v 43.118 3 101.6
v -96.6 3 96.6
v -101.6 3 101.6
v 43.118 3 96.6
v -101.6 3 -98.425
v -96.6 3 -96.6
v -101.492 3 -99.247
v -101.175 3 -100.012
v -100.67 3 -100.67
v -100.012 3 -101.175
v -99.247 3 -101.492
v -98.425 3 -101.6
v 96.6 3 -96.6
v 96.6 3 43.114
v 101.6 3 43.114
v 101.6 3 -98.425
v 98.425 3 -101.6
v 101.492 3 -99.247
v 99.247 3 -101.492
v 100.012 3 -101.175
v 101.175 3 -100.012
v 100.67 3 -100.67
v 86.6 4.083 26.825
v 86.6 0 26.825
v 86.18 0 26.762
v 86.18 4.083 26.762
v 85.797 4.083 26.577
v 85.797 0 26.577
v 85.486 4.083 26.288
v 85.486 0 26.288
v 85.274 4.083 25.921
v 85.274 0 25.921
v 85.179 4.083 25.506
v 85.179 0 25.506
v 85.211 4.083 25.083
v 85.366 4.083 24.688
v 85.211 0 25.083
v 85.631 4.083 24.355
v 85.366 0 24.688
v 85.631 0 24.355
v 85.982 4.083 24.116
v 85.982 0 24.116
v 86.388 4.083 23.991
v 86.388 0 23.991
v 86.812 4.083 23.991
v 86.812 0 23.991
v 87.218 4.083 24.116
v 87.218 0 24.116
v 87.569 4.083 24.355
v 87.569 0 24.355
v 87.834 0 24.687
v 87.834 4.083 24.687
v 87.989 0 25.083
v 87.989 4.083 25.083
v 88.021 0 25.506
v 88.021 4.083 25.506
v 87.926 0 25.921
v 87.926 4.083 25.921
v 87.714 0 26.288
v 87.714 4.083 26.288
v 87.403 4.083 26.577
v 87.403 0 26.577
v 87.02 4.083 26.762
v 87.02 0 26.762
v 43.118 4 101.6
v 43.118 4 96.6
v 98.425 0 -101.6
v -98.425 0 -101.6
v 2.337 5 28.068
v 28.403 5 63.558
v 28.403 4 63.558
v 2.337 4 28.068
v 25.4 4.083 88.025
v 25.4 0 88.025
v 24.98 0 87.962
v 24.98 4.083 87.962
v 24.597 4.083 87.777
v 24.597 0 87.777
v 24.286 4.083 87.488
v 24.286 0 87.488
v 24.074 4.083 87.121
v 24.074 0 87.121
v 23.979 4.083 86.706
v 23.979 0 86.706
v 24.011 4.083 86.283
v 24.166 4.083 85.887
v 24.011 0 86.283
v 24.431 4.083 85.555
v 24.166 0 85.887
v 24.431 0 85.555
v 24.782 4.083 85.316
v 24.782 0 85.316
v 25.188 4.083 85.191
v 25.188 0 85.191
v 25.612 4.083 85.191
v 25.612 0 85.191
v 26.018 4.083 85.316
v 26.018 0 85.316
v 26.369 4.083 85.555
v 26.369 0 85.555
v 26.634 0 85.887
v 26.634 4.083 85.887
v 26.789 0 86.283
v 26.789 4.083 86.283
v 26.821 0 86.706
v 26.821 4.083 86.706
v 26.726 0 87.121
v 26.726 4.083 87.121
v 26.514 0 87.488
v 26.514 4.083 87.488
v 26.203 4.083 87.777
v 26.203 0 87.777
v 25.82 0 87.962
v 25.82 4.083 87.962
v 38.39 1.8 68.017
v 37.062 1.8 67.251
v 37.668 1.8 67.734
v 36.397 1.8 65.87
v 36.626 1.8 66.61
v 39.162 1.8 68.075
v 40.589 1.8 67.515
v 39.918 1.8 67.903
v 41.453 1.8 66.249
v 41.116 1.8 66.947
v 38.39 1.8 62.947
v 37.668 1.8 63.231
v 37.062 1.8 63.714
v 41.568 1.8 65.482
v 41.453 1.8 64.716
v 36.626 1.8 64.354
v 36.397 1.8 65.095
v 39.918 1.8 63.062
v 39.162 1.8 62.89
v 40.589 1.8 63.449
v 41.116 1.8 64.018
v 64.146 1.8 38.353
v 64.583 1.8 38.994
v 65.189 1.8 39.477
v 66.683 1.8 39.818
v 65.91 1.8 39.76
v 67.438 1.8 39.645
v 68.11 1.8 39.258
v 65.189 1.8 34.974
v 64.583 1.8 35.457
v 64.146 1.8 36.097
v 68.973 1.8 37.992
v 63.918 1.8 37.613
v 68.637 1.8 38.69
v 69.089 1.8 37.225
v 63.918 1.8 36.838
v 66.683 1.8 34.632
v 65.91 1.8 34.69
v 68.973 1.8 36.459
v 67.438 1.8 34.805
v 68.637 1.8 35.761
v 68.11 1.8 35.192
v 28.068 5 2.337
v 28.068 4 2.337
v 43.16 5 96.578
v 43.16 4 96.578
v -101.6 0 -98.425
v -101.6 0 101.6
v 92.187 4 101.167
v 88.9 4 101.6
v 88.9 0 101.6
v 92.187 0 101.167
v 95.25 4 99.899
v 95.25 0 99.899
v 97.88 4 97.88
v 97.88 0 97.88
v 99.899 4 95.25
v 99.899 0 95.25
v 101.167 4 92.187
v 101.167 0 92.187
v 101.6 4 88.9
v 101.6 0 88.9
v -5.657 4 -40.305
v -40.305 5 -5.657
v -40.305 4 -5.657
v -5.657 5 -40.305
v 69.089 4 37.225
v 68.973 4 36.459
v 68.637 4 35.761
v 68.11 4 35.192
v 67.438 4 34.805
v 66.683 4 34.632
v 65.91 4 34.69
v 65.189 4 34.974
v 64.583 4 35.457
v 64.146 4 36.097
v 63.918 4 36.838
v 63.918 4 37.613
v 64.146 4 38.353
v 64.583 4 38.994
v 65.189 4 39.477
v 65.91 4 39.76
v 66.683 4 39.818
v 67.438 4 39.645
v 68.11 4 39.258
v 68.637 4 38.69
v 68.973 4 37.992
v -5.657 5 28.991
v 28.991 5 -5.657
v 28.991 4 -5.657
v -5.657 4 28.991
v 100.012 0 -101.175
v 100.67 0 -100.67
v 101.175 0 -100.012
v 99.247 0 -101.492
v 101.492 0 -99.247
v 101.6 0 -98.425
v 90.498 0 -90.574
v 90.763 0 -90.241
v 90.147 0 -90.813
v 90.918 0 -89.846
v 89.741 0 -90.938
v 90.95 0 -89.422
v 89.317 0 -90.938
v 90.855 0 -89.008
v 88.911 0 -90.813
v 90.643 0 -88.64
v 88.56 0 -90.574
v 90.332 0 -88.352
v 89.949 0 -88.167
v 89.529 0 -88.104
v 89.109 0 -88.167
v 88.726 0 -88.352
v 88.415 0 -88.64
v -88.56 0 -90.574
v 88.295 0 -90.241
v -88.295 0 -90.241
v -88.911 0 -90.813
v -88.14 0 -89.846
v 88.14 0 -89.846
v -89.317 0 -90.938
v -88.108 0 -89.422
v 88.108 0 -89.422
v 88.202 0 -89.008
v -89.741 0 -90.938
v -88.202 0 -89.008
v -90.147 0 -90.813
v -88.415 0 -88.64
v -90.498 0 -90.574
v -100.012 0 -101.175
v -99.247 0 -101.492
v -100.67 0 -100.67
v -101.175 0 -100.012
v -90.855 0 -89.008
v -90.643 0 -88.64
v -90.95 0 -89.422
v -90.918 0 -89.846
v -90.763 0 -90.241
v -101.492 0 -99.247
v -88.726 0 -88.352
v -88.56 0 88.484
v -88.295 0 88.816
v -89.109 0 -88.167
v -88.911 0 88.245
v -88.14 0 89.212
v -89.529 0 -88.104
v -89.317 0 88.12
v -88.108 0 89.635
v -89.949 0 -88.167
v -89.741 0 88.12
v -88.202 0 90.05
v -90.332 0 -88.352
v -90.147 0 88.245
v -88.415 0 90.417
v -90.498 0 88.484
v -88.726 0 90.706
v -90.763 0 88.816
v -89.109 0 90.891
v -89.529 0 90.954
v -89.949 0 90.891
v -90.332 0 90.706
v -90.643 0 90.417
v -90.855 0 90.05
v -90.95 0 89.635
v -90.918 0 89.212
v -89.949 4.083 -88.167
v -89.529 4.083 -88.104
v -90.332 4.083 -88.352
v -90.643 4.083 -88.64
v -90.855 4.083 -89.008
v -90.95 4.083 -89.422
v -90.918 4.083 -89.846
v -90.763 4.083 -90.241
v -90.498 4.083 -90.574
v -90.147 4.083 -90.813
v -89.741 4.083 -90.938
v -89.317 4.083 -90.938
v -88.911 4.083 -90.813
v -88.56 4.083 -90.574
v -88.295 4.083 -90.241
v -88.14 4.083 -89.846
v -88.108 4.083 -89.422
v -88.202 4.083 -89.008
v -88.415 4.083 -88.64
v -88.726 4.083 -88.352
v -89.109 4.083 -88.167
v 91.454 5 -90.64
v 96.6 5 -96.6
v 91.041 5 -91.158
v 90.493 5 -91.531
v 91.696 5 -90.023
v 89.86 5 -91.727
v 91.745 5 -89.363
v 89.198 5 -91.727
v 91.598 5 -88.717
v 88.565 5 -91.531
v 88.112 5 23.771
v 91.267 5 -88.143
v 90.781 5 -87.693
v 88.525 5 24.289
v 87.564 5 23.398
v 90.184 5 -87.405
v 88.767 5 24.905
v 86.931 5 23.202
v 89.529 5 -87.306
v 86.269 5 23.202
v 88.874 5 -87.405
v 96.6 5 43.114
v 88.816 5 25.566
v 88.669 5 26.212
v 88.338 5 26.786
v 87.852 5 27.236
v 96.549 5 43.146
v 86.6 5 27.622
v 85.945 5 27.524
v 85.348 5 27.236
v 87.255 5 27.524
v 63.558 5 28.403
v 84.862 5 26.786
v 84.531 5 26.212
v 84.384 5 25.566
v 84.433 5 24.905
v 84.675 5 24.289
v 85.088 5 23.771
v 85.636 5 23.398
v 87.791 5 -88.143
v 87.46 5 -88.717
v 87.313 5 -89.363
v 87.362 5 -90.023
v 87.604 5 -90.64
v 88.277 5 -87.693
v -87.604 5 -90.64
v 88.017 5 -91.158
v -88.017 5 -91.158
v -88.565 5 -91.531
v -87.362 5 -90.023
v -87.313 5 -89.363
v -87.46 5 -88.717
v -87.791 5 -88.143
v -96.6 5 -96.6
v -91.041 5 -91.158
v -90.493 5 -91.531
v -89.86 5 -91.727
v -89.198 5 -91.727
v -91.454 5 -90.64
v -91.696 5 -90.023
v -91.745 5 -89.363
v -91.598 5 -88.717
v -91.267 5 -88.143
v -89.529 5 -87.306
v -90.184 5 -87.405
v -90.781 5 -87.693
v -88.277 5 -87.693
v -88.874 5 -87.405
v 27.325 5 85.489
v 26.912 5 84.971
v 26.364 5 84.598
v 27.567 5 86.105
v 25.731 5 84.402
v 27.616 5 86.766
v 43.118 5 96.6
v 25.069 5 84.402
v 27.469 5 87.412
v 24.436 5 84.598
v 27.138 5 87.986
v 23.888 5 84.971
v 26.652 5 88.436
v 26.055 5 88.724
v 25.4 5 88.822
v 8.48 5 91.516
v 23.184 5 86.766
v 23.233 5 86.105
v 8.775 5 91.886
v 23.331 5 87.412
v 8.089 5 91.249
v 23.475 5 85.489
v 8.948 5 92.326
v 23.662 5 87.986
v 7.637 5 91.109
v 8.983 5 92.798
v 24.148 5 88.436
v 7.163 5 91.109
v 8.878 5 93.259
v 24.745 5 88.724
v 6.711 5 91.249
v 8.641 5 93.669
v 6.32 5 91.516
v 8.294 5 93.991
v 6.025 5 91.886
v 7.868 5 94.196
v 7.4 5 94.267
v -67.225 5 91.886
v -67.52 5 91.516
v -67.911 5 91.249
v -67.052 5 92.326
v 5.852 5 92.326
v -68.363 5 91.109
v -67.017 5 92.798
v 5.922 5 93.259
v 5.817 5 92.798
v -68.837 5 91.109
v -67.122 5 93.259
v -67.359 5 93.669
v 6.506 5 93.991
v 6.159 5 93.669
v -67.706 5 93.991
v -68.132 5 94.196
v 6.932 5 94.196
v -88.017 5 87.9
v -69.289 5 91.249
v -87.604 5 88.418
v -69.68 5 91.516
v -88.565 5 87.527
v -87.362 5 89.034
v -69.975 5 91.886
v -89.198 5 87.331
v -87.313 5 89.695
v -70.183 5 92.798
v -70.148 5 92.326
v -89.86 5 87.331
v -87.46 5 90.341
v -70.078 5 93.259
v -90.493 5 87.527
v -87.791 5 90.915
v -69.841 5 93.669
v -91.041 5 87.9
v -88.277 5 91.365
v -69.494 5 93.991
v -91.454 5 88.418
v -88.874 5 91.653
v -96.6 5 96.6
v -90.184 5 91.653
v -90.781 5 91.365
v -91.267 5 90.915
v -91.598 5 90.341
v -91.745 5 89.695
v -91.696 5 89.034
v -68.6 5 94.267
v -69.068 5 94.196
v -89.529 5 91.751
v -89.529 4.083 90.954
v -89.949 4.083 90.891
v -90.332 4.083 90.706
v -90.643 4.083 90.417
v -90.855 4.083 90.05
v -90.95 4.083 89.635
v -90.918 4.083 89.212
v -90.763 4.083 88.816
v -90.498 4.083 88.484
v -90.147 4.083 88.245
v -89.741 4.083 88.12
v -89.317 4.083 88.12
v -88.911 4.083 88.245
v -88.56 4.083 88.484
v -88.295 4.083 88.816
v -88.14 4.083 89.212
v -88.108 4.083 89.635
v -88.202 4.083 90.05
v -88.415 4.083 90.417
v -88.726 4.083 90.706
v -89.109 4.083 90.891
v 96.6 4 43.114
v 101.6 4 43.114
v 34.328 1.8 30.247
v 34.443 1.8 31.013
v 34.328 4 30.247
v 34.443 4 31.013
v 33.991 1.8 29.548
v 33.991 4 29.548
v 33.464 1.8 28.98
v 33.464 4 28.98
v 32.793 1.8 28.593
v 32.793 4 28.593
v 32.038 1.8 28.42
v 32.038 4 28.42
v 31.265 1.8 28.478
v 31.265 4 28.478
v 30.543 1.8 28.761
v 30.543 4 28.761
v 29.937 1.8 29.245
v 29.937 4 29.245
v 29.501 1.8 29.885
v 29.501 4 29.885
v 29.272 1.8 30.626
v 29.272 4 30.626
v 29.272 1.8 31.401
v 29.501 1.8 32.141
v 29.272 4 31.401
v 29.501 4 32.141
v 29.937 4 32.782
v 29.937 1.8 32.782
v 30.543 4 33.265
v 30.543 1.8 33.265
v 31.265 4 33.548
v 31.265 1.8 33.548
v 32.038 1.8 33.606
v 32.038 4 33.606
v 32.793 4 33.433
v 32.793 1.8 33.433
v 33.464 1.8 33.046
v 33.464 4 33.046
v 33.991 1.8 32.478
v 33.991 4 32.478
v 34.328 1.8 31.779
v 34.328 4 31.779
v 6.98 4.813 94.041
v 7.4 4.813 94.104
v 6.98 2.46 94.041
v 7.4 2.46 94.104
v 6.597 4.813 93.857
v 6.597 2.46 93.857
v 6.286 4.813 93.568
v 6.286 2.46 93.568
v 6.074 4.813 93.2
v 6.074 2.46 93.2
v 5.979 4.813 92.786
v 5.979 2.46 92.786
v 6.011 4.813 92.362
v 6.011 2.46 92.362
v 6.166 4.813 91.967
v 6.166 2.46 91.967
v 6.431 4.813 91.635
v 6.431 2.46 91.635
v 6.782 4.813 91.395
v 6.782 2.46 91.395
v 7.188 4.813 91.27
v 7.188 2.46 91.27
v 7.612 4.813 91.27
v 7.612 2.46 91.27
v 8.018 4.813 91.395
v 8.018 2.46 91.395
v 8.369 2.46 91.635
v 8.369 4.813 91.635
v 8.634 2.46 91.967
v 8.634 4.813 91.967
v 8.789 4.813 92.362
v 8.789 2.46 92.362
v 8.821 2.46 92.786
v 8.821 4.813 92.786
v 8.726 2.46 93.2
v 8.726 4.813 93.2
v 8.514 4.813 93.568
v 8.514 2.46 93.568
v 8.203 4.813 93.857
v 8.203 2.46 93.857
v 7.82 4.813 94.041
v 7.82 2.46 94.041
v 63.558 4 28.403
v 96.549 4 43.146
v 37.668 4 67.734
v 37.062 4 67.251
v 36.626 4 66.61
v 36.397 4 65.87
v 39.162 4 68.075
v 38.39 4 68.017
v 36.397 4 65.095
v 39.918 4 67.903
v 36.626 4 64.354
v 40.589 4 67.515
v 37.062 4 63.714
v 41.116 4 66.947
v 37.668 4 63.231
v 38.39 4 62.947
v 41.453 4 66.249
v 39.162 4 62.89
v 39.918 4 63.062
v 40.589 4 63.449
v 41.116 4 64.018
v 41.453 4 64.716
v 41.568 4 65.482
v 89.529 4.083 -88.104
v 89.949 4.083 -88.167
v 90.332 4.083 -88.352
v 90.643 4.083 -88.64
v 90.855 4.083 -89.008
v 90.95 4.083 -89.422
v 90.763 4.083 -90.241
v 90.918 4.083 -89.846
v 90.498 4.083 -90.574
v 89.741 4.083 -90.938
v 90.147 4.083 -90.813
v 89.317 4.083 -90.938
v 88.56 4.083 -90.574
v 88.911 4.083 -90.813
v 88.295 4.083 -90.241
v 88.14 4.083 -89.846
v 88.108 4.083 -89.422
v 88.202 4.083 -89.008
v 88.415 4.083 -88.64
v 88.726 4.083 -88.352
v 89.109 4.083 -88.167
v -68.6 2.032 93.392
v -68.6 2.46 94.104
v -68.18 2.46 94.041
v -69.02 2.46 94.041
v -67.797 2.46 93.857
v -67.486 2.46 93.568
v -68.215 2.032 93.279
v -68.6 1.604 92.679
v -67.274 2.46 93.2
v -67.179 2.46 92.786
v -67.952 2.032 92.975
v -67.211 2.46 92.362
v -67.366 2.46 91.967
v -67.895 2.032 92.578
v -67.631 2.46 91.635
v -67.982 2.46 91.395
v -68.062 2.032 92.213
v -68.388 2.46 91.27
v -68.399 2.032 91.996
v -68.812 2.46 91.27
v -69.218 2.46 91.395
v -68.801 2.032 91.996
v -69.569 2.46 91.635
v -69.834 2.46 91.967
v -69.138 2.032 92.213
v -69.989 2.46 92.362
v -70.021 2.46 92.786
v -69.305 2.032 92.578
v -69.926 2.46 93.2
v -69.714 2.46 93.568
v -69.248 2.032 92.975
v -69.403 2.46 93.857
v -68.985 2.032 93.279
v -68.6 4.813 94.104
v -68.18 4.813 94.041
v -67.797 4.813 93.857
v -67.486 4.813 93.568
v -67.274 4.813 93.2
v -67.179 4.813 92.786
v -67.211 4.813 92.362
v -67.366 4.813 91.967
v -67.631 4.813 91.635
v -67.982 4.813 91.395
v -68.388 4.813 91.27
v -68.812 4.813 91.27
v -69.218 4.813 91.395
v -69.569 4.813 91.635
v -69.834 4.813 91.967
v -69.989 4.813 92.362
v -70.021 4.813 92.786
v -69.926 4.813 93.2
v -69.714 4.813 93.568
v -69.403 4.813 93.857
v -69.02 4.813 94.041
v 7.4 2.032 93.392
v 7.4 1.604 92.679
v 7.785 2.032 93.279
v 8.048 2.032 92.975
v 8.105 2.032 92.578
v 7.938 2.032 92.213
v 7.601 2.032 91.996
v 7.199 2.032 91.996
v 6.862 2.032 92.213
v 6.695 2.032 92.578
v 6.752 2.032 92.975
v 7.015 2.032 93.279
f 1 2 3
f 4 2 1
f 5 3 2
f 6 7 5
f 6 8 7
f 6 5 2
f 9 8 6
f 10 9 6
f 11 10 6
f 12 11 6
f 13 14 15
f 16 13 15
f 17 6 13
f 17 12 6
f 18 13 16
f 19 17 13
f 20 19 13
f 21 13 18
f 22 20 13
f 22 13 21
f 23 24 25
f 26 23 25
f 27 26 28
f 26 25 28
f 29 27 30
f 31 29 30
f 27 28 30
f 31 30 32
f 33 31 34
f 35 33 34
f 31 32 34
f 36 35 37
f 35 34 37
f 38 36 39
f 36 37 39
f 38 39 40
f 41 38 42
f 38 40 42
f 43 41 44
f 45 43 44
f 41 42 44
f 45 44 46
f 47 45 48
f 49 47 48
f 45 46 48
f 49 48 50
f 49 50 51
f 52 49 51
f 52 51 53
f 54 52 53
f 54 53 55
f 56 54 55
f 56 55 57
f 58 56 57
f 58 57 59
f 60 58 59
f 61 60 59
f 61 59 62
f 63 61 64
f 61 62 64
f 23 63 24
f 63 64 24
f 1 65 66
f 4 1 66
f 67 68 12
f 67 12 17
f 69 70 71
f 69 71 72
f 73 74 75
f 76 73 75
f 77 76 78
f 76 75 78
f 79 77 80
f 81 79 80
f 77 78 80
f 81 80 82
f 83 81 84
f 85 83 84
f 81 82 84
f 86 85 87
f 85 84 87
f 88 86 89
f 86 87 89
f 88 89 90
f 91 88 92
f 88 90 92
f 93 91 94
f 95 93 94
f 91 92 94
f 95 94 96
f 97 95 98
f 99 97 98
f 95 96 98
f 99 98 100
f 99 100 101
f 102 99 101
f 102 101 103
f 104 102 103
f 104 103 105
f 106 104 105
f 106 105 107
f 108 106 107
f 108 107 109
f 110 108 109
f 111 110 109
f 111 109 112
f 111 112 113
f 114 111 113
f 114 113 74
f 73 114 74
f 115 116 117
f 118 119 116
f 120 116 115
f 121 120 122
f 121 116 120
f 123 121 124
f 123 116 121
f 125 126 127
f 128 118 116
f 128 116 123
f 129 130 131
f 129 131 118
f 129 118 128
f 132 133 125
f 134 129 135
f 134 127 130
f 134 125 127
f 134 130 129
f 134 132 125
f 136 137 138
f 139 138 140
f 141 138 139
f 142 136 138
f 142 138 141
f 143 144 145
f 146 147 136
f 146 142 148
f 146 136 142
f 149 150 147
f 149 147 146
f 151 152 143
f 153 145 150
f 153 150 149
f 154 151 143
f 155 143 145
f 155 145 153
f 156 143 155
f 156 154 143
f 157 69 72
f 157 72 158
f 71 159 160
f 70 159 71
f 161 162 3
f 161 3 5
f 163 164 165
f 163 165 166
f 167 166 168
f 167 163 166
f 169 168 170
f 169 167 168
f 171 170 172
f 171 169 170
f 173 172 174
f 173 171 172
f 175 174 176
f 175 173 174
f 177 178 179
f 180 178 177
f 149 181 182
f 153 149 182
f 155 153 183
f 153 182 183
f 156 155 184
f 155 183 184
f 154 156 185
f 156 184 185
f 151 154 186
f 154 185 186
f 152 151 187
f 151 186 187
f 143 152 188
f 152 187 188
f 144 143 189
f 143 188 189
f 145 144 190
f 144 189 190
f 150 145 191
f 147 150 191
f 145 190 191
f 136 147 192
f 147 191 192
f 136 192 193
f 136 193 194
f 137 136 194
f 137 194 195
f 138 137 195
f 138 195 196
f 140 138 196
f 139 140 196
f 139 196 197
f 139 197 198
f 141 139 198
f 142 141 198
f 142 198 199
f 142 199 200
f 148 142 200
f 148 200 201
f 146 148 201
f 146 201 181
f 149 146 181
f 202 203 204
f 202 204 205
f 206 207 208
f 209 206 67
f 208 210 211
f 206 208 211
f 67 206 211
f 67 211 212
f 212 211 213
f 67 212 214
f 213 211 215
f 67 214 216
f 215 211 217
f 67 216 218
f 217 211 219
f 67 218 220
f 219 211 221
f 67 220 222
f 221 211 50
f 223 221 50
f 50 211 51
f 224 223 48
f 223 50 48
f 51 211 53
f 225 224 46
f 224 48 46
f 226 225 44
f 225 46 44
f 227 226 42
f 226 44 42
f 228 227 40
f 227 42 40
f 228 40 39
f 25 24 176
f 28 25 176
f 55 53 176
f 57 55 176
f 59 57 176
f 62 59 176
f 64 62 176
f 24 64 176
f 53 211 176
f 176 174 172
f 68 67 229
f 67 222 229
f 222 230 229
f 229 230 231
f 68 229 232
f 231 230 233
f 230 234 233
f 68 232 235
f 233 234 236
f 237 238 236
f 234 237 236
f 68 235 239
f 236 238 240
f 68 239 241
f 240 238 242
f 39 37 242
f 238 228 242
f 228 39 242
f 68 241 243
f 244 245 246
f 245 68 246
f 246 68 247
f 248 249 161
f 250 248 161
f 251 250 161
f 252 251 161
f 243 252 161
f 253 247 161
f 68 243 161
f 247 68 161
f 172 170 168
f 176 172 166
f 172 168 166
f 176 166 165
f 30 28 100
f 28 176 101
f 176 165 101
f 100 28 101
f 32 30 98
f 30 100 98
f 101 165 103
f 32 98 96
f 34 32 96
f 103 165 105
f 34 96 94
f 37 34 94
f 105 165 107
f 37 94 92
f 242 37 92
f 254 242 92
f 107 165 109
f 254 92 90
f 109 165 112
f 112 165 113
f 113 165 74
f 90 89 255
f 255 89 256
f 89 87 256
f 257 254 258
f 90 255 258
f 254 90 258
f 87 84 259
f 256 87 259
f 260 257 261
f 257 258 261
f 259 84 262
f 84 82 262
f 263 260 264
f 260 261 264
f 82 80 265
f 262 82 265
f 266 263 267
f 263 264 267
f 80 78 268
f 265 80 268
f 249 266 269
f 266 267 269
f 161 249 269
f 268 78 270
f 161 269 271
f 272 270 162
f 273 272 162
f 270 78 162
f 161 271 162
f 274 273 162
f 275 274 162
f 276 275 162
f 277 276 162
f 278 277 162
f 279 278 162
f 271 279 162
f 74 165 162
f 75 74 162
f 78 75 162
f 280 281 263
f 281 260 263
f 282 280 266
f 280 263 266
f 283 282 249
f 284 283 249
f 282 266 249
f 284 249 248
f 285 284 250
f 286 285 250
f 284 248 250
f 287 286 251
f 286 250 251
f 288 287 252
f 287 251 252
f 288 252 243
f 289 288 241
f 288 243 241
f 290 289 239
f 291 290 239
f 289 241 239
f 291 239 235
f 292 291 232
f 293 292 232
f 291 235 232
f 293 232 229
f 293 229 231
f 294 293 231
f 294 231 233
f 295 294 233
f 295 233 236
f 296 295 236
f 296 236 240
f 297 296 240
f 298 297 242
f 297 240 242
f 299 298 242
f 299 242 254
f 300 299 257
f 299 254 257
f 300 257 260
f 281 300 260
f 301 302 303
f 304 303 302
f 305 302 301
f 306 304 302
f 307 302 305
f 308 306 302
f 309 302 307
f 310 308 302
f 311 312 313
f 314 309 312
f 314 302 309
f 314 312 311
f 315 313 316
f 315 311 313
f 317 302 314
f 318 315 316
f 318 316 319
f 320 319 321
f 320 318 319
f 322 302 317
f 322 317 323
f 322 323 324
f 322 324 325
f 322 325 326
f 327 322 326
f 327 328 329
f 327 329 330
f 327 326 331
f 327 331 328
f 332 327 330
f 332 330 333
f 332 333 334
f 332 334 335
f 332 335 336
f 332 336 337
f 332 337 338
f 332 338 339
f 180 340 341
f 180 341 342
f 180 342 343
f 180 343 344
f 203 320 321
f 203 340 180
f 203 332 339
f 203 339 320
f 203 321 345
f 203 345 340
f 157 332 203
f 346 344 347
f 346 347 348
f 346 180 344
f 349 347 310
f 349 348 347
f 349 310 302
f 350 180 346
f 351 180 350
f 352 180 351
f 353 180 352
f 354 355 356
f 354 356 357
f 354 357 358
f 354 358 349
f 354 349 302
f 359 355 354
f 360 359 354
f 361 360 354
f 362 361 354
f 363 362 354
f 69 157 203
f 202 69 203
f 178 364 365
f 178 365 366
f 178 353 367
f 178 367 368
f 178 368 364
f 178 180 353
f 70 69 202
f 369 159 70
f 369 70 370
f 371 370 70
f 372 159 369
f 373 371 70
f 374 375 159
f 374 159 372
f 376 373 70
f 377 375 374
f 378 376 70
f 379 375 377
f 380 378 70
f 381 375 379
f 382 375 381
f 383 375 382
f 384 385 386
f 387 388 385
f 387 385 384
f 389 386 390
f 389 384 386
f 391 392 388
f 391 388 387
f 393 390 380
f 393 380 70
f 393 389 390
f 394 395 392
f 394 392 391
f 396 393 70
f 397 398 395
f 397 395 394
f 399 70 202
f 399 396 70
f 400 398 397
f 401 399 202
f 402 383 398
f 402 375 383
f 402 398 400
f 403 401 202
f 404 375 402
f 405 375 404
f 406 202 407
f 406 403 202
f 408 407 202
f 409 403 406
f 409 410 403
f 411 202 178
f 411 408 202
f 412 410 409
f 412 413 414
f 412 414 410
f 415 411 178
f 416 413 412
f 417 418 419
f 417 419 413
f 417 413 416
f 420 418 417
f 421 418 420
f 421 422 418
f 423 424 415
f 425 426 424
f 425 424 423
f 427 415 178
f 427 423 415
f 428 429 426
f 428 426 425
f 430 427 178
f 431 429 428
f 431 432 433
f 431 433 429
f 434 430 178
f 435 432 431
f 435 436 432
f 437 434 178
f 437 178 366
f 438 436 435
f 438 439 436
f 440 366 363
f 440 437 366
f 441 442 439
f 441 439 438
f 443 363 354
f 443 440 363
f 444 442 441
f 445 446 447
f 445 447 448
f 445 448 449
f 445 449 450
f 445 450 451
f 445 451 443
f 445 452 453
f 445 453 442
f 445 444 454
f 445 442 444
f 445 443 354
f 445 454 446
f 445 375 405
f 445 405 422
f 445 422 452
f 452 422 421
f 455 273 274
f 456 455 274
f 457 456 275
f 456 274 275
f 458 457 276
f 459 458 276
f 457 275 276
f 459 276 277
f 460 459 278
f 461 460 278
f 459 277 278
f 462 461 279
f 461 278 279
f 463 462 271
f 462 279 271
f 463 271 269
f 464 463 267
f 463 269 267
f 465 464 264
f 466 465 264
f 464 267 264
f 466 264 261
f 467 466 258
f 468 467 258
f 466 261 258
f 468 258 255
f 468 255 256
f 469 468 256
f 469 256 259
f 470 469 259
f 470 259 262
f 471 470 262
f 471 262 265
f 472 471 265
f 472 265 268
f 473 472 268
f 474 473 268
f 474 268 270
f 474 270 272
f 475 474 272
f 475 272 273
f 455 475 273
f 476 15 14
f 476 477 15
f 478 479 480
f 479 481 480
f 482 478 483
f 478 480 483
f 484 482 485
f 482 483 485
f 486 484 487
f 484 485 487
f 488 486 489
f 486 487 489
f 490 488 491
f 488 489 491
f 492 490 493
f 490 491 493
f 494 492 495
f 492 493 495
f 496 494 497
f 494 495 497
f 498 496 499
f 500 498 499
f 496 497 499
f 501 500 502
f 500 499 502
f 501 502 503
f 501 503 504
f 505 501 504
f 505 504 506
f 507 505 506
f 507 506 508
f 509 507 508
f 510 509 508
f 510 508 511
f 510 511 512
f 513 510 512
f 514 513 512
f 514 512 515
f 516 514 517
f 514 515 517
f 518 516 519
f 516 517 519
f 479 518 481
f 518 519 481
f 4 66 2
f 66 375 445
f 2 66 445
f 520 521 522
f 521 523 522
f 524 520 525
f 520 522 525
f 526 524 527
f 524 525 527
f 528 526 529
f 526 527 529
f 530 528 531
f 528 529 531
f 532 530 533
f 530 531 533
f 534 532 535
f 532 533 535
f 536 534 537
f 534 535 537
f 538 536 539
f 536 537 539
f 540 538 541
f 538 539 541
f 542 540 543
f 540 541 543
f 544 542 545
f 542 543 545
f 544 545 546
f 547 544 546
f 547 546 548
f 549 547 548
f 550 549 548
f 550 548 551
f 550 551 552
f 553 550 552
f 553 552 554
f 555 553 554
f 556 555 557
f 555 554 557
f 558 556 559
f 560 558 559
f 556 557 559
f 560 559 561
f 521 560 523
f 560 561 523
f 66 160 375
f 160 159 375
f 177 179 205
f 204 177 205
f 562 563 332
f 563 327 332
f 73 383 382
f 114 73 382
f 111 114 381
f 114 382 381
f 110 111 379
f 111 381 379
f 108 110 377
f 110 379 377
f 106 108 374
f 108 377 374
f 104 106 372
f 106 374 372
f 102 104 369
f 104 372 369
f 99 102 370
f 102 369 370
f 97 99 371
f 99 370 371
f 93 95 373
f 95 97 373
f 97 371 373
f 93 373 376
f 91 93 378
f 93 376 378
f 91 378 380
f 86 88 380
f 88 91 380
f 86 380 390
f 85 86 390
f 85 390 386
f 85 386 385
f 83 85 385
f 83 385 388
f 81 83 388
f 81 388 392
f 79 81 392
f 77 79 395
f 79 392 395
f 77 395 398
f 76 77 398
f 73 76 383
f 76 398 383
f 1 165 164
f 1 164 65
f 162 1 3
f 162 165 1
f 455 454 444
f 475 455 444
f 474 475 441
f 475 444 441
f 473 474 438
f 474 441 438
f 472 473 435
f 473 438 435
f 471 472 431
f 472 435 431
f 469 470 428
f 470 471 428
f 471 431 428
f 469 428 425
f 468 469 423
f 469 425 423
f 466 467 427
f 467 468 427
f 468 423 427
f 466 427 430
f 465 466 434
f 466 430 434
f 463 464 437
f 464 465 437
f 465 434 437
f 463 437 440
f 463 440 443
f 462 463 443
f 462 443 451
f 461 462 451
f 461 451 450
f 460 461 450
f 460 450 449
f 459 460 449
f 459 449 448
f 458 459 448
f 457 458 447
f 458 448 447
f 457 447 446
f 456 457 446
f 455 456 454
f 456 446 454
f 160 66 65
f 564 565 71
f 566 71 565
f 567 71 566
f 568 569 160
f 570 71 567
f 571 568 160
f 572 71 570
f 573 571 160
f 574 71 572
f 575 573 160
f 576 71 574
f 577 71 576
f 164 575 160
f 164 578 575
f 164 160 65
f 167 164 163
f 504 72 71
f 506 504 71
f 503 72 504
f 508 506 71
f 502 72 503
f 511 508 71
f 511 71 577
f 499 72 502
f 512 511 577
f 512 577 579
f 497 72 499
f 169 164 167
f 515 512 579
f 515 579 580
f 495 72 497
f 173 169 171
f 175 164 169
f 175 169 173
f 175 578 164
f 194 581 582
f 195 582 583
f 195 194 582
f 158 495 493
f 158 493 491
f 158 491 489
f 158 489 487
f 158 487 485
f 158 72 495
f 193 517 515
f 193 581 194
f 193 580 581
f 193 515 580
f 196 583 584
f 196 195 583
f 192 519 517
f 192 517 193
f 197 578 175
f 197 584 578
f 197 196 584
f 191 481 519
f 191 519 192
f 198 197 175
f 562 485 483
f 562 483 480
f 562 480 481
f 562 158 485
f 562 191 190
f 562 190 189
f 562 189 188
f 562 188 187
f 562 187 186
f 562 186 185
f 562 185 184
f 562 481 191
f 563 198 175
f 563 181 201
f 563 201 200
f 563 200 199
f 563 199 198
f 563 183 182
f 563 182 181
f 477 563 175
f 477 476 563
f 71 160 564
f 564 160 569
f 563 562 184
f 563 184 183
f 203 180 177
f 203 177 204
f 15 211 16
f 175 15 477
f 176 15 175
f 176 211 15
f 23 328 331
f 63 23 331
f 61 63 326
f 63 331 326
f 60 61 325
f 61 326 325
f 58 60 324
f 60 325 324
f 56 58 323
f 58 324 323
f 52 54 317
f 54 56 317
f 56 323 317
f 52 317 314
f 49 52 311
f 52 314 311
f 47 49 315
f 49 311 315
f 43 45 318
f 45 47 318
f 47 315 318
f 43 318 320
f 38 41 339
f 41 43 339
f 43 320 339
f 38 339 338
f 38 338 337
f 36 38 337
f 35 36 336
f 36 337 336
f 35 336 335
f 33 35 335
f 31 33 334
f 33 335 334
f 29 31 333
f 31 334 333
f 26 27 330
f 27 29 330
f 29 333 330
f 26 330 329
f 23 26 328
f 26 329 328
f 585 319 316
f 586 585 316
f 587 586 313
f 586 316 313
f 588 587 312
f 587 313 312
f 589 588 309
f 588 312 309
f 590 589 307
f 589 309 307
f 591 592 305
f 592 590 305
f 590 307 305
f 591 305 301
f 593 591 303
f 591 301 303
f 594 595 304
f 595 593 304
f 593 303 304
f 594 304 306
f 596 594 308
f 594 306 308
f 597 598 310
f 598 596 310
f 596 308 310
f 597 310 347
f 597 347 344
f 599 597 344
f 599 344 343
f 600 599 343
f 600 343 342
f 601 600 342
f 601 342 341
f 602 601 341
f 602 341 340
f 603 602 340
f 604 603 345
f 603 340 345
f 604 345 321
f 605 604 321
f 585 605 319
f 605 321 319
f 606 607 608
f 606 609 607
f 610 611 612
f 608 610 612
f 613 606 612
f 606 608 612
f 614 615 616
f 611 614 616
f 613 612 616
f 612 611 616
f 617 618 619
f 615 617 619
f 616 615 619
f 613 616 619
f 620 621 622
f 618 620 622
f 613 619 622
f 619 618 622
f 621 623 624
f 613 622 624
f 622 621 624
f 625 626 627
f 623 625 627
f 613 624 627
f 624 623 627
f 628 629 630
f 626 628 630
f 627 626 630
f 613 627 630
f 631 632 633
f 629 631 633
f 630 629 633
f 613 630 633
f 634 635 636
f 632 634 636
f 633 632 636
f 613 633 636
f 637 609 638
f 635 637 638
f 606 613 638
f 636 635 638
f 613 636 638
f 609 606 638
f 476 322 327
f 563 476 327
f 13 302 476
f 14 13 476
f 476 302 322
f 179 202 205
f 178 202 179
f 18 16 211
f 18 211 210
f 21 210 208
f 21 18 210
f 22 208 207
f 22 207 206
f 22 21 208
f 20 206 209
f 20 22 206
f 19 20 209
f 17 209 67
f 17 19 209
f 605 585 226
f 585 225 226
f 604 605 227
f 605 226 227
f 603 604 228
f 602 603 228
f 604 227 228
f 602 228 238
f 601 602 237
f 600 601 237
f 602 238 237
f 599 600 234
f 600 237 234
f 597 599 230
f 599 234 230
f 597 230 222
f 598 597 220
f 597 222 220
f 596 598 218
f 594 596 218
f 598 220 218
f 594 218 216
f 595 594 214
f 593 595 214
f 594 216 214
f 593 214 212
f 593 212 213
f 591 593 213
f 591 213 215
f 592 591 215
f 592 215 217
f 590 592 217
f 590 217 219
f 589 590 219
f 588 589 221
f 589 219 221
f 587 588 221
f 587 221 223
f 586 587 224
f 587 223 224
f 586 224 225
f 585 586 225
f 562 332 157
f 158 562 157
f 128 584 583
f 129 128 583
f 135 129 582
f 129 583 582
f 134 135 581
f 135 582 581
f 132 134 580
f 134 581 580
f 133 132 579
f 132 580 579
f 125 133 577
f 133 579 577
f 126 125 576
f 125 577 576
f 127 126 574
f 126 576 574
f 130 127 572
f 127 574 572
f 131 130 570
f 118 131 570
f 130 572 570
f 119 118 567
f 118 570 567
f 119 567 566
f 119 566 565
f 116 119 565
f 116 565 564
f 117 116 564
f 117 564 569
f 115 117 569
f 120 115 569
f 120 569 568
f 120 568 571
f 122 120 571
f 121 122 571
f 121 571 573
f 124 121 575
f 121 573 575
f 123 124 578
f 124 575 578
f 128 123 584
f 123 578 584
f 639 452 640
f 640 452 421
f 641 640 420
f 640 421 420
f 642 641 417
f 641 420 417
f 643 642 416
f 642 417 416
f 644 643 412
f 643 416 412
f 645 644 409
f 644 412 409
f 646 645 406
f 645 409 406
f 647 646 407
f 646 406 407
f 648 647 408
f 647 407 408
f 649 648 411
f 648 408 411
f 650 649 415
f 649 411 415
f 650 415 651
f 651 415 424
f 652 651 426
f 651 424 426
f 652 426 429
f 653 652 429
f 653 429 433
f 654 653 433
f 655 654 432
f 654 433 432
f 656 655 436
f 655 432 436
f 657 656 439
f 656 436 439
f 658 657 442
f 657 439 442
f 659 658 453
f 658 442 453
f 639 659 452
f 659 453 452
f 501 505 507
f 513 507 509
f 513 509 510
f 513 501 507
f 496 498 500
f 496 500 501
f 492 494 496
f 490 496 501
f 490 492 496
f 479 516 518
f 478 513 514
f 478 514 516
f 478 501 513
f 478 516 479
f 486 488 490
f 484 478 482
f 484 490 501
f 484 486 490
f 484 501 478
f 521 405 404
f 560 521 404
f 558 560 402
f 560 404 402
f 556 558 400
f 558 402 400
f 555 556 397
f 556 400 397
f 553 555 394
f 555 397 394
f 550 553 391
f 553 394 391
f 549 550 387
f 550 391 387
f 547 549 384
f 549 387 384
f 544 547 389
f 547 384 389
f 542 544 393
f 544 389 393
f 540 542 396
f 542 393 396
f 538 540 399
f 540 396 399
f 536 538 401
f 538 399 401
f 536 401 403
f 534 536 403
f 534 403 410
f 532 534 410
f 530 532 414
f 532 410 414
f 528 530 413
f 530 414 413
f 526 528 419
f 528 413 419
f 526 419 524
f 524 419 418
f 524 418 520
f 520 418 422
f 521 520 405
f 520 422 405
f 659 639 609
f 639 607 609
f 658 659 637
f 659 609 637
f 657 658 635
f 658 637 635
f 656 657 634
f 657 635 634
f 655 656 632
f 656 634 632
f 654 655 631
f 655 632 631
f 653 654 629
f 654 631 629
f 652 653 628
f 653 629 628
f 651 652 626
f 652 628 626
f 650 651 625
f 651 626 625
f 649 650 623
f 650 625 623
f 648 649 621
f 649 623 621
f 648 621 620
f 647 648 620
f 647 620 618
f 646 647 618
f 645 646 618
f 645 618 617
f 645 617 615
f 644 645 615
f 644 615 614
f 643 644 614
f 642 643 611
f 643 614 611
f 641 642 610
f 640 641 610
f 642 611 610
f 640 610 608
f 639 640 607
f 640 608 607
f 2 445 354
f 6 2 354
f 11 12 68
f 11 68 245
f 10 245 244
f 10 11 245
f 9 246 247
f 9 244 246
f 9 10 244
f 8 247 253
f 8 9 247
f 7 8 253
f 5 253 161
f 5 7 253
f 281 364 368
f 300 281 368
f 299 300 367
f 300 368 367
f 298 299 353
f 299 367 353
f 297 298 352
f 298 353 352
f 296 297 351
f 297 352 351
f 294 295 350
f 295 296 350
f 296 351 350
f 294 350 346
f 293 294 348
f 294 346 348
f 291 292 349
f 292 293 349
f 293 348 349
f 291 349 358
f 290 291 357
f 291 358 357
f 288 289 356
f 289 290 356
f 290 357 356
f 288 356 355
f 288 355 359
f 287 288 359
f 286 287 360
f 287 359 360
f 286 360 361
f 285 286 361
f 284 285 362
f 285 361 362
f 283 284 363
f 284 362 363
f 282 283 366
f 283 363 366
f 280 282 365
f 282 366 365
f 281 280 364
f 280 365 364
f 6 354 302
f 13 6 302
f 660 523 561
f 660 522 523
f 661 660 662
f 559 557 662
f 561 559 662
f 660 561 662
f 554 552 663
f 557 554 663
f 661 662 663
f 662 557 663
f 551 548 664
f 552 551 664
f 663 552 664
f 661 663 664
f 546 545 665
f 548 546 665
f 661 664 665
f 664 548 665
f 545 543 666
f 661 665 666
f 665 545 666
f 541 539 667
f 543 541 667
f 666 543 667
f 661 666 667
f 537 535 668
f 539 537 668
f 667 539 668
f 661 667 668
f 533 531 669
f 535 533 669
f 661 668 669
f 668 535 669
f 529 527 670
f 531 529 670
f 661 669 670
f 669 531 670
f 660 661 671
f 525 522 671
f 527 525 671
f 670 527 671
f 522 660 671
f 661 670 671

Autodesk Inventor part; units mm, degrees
ref_plane "YZ Plane" through (0, 0, 0) normal (1, 0, 0) x (0, 1, 0)
ref_plane "XZ Plane" through (0, 0, 0) normal (0, 1, 0) x (-1, 0, 0)
sketch "Sketch1" plane through (0, 0, 0) normal (0, 1, 0) x (-1, 0, 0)
  line L0 (101.6, -101.6) -> (-101.6, -101.6)
  line L1 (-101.6, -101.6) -> (-101.6, 101.6)
  line L2 (-101.6, 101.6) -> (101.6, 101.6)
  line L3 (101.6, 101.6) -> (101.6, -101.6)
  line L4 (96.6, -96.6) -> (-96.6, -96.6)
  line L5 (-96.6, -96.6) -> (-96.6, 96.6)
  line L6 (-96.6, 96.6) -> (96.6, 96.6)
  line L7 (96.6, 96.6) -> (96.6, -96.6)
  line L8 (101.6, 101.6) -> (-40.4, 101.6)
  circle A0 centre (0, 0) radius 88.9
  circle A1 centre (0, 0) radius 109.337642
  line L9 (-40.4, 101.6) -> (-101.6, 40.4)
  line L10 (-45.4, 101.6) -> (-101.6, 45.4)
  line L11 (96.6, 96.6) -> (96.6, 101.6)
  line L12 (-45.4, 101.6) -> (-35.4, 101.6)
  line L13 (-35.4, 101.6) -> (-35.4, 96.6)
  line L14 (-35.4, 96.6) -> (-45.4, 96.6)
  line L15 (-45.4, 96.6) -> (-45.4, 101.6)
  line L16 (-45.4, 101.6) -> (-43.114, 101.6)
  line L17 (-43.114, 101.6) -> (-43.114, 96.6)
  line L18 (-43.114, 96.6) -> (-45.4, 96.6)
  line L19 (-45.4, 96.6) -> (-45.4, 101.6)
  line L20 (-96.6, 45.4) -> (-101.6, 45.4)
  line L21 (-101.6, 45.4) -> (-101.6, 43.114)
  line L22 (-101.6, 43.114) -> (-96.6, 43.114)
  line L23 (-96.6, 43.114) -> (-96.6, 45.4)
  point P0 (96.6, 51.216794)
  point P1 (101.6, 40.4)
  point P2 (101.6, -40.4)
  point P3 (96.6, -51.216794)
  point P4 (-96.6, 45.4)
  point P5 (-45.4, 96.6)
  dimension "d0" = 203.2
  dimension "d1" = 203.2
  dimension "d2" = 101.6
  dimension "d3" = 101.6
  dimension "d4" = 5
  dimension "d5" = 5
  dimension "d6" = 5
  dimension "d7" = 5
  dimension "d10" = 142
  dimension "d12" = 61.2
  dimension "d14" = 177.8
  dimension "d15" = 5
  dimension "d16" = 5
  dimension "d17" = 10
  dimension "d86" = 2.286
  dimension "d87" = 2.286
extrude "Extrusion1" add sketch "Sketch1" along normal blind 5 contours L0 A1 L4 L7 L3 | L0 A1 L4 | A1 L7 L3 | L0 L1 A1 L5 L4 | A1 L7 L4 | L4 A1 L5 L9 L6 L7 | A1 L7 L11 L2 L3 | L4 L5 A1 | A1 L6 L7 | L1 L9 L22 L5 A1 | L11 L6 A1 L2 | L6 L13 L2 A1 | L1 L22 A1 | A1 L22 L9 | L22 L9 L5 | L6 L17 L9 L2 L13 | L1 L20 A1 L22 | A1 L20 L9 L22 | L20 A1 L10 L5 | L5 L10 L6 L9 | A1 L17 L2 | L9 L17 A1 | L6 L9 L17 | L1 L2 L10 A1 L6 L5 | L10 A1 L20 | L10 A1 L5 | L5 A1 L6 L10 | L15 A1 L17 L9 | L6 L10 A1 L15 | L17 A1 L15 L2 | L5 L6 A1 | L6 A1 L10 | A1 L10 L15 | A0
sketch "Sketch3" plane through (0, 5, 0) normal (0, 1, 0) x (1, 0, 0)
  circle A0 centre (0, 0) radius 88.9
  line L0 (-101.6, 101.6) -> (-101.6, -101.6)
  line L1 (-101.6, -101.6) -> (101.6, -101.6)
  line L2 (-101.6, 101.6) -> (101.6, 101.6)
  line L3 (101.6, 101.6) -> (101.6, -101.6)
  line L4 (101.6, -101.6) -> (-101.6, -101.6)
  line L5 (-101.6, -101.6) -> (-101.6, 101.6)
  line L6 (-96.6, 96.6) -> (96.6, 96.6)
  line L7 (96.6, 96.6) -> (96.6, -96.6)
  line L8 (96.6, -96.6) -> (-96.6, -96.6)
  line L9 (-96.6, -96.6) -> (-96.6, 96.6)
  line L10 (-101.6, -101.6) -> (40.4, -101.6)
  circle A1 centre (0, 0) radius 109.337642
  line L11 (40.4, -101.6) -> (101.6, -40.4)
  line L12 (101.6, -101.6) -> (101.6, 101.6)
  line L13 (45.4038, -101.6) -> (101.6, -45.4038)
  line L14 (96.6, -45.4) -> (101.6, -45.4038)
  line L15 (45.4, -96.6) -> (45.4038, -101.6)
  line L16 (96.6, -45.4) -> (101.6, -45.4)
  line L17 (101.6, -45.4) -> (101.6, -43.114)
  line L18 (101.6, -43.114) -> (96.6, -43.114)
  line L19 (96.6, -43.114) -> (96.6, -45.4)
  line L20 (45.4038, -101.6) -> (43.1178, -101.6)
  line L21 (43.1178, -101.6) -> (43.1178, -96.6)
  line L22 (43.1178, -96.6) -> (45.4038, -96.6)
  line L23 (45.4038, -96.6) -> (45.4038, -101.6)
  point P0 (45.4038, -101.6)
  point P1 (50.4038, -96.6)
  point P2 (96.6, -50.4038)
  dimension "d28" = 177.8
  dimension "d29" = 5
  dimension "d30" = 5
  dimension "d31" = 5
  dimension "d32" = 5
  dimension "d33" = 142
  dimension "d76" = 5.0038
  dimension "d77" = 5.0038
  dimension "d88" = 2.286
  dimension "d89" = 2.286
extrude "Extrusion3" cut sketch "Sketch3" against normal blind 2 contours L2 A1 L6 L9 L0 | A1 L9 L0 | L2 A1 L6 | A1 L9 L8 L1 L0 | L2 L3 A1 L7 L6 | A1 L8 L21 L11 L1 | L3 L11 L18 L7 A1 | A1 L21 L1 | L11 L21 A1 | L3 L18 A1 | A1 L18 L11
sketch "Sketch4" plane through (0, 5, 0) normal (0, 1, 0) x (1, 0, 0)
  line L0 (101.6, 101.6) -> (-101.6, 101.6)
  line L1 (-101.6, 101.6) -> (-101.6, -101.6)
  line L2 (-101.6, -101.6) -> (101.6, -101.6)
  line L3 (101.6, -101.6) -> (101.6, 101.6)
  circle A0 centre (0, 0) radius 2.5
  line L4 (11.331386, 2.138998) -> (-2.138998, -11.331386)
  line L5 (0, 0) -> (-5.656854, 5.656854)
  line L6 (-5.656854, -14.849242) -> (-26.162951, 5.656855)
  line L7 (-5.656854, 26.162952) -> (14.849242, 5.656855)
  circle A1 centre (-5.656854, 5.656854) radius 14
  line L8 (-26.162951, 5.656855) -> (-5.656854, 26.162952)
  line L9 (14.849242, 5.656855) -> (-5.656854, -14.849242)
  line L10 (-40.305087, 5.656855) -> (-5.656854, 40.305087)
  line L11 (-5.656854, 40.305087) -> (28.991378, 5.656855)
  line L12 (28.991378, 5.656855) -> (-5.656854, -28.991377)
  line L13 (-5.656854, -28.991377) -> (-40.305087, 5.656855)
  line L14 (-22.645095, 9.174711) -> (-9.174711, 22.645095)
  line L15 (-9.174711, 22.645095) -> (-12.766813, 26.237197)
  line L16 (-12.766813, 26.237197) -> (-26.237197, 12.766813)
  line L17 (-26.237197, 12.766813) -> (-22.645095, 9.174711)
  point P0 (9.525, 22.5)
  point P1 (-9.525, -6.5)
  dimension "d37" = 203.2
  dimension "d38" = 203.2
  dimension "d39" = 8
  dimension "d40" = 28
  dimension "d41" = 29
  dimension "d42" = 29
  dimension "d43" = 14.5
  dimension "d44" = 10
  dimension "d45" = 10
  dimension "d46" = 10
  dimension "d47" = 10
  dimension "d48" = 5.08
  dimension "d49" = 9.525
  dimension "d50" = 9.525
  dimension "d55" = 101.6
  dimension "d56" = 101.6
extrude "Extrusion4" cut sketch "Sketch4" against normal blind 1 contours A0 | L4 L9 L6 L8 L7 | L8 L17 L16 L15 | A1 | L10 L11 L12 L13
sketch "Sketch6" plane through (0, 5, 0) normal (0, 1, 0) x (1, 0, 0)
  line L0 (45.4038, -101.6) -> (0, 0)
  line L1 (50.4038, -96.6) -> (45.4038, -101.6)
  line L2 (96.6, -43.114) -> (96.6, 96.6)
  line L3 (101.6, -101.6) -> (101.6, 101.6)
  circle A0 centre (0, 0) radius 34.925
  circle A1 centre (0, 0) radius 33.425
  line L4 (-101.6, 101.6) -> (-101.6, -101.6)
  line L5 (-101.6, -101.6) -> (40.4, -101.6)
  line L6 (-101.6, -101.6) -> (101.6, -101.6)
  line L7 (101.6, 101.6) -> (101.6, -43.114)
  line L8 (101.6, -45.4038) -> (0, 0)
  line L9 (-96.6, -96.6) -> (43.1178, -96.6)
  line L10 (96.6, -43.114) -> (96.6, 96.6)
  line L11 (43.1178, -101.6) -> (-101.6, -101.6)
  line L12 (101.6, -45.4038) -> (96.6, -50.4038)
  line L13 (45.4038, -101.6) -> (101.6, -45.4038)
  line L14 (43.1178, -101.6) -> (101.6, -101.6)
  line L15 (0, 0) -> (101.6, -50.4076)
  line L16 (50.4076, -101.6) -> (0, 0)
  line L17 (43.169361, -96.6) -> (47.926911, -96.6)
  line L18 (96.6, -43.169361) -> (96.6, -47.926911)
  line L19 (40.4, -101.6) -> (101.6, -40.4)
  point P0 (13.637413, -30.516415)
  point P1 (30.516415, -13.637413)
  point P2 (14.249414, -31.885888)
  point P3 (31.286053, -15.522194)
  point P4 (29.942343, -14.855528)
  point P5 (31.885888, -14.249414)
  point P6 (98.255522, -48.748278)
  point P7 (96.6, -47.926911)
  point P8 (47.926911, -96.6)
  point P9 (15.522194, -31.286053)
  point P10 (96.6, -45.4)
  point P11 (45.4, -96.6)
  point P12 (14.855528, -29.942343)
  point P13 (96.6, -45.4)
  point P14 (45.4, -96.6)
  point P15 (45.4, -96.6)
  point P16 (47.088956, -94.911044)
  point P17 (94.911044, -47.088956)
  point P18 (96.6, -45.4)
  point P19 (43.858319, -98.141681)
  point P20 (98.141681, -43.858319)
  point P21 (45.4, -96.6)
  point P22 (96.6, -45.4)
  dimension "d71" = 69.85
  dimension "d72" = 66.85
  dimension "d75" = 142
  dimension "d78" = 5.0038
  dimension "d82" = 5.0038
extrude "Extrusion6" cut sketch "Sketch6" against normal blind 1 contours L0 A0 L16 L19 L17 | L0 A1 L16 A0 | L16 A1 L15 A0 | L15 A0 L8 L18 L19 | A0 L15 A1 L8
fillet "Fillet3" radius 12.7 1 edges at (101.6, 2.5, 101.6)
sketch "Sketch9" plane through (0, 4, 0) normal (0, 1, 0) x (1, 0, 0)
  point P0 (0, 0)
sketch "Sketch10" plane through (0, 5, 0) normal (0, 1, 0) x (1, 0, 0)
  point P0 (0, 0)
ref_plane "Work Plane1" through (24.695704, 5, 24.695704) normal (0.7071068, 0, 0.7071068) x (0.7071068, 0, -0.7071068)
sketch "Sketch15" plane through (0, 5, 0) normal (0, 1, 0) x (1, 0, 0)
  line L0 (43.169361, -96.6) -> (13.637413, -30.516415)
  line L1 (28.403387, -63.558207) -> (-0.656854, -23.991377)
  line L2 (28.991378, 5.656855) -> (-5.656854, -28.991377)
  line L3 (30.516415, -13.637413) -> (96.6, -43.169361)
  line L4 (-5.656854, 40.305087) -> (28.991378, 5.656855)
  line L5 (63.558207, -28.403387) -> (23.991378, 0.656855)
  line L6 (2.337401, -28.06819) -> (28.068191, -2.3374)
  arc A0 (13.637413, -30.516415) -> (30.516415, -13.637413) centre (0, 0) ccw
  line L7 (28.403387, -63.558207) -> (13.637413, -30.516415)
  line L8 (63.558207, -28.403387) -> (30.516415, -13.637413)
  arc A1 (13.637413, -30.516415) -> (30.516415, -13.637413) centre (0, 0) ccw
  line L9 (28.619467, -64.395349) -> (1.630294, -28.775297)
  line L10 (1.630294, -28.775297) -> (2.337401, -28.06819)
  dimension "d138" = 5
  dimension "d139" = 5
  dimension "d140" = 5
  dimension "d168" = 1
extrude "Extrusion11" cut sketch "Sketch15" against normal blind 1 contours L1 L6 L5 L3 A0 L0
sketch "Sketch16" plane through (0, 4, 0) normal (0, 1, 0) x (1, 0, 0)
  line L0 (2.337401, -28.06819) -> (28.068191, -2.3374)
  line L1 (9.408468, -20.997123) -> (12.944002, -24.532656)
  line L2 (12.944002, -24.532656) -> (24.532657, -12.944002)
  line L3 (24.532657, -12.944002) -> (20.997123, -9.408468)
  line L4 (12.944002, -24.532656) -> (24.532657, -12.944002)
  line L5 (24.532657, -12.944002) -> (28.559218, -16.970562)
  line L6 (28.559218, -16.970562) -> (16.970563, -28.559217)
  line L7 (16.970563, -28.559217) -> (12.944002, -24.532656)
  line L8 (12.944002, -24.532656) -> (5.331655, -32.145003)
  line L9 (28.403387, -63.558207) -> (2.337401, -28.06819)
  line L10 (24.532657, -12.944002) -> (32.145004, -5.331655)
  line L11 (28.068191, -2.3374) -> (63.558207, -28.403387)
  point P0 (0, 0)
  dimension "d144" = 10
  dimension "d145" = 10
  dimension "d146" = 5
  dimension "d152" = 0
  dimension "d153" = 0
extrude "Extrusion12" cut sketch "Sketch16" along normal up to surface (1 mm away)
sketch "Sketch20" plane through (0, 5, 0) normal (0, 1, 0) x (1, 0, 0)
  line L0 (47.088956, -94.911044) -> (45.4, -96.6)
  line L1 (47.088956, -94.911044) -> (94.937604, -47.062396)
  line L2 (94.164915, -47.835085) -> (33.507042, -17.740422)
  line L3 (94.911044, -47.088956) -> (31.286053, -15.522194)
  line L4 (15.522194, -31.286053) -> (47.088956, -94.911044)
  line L5 (17.526471, -33.075809) -> (47.835085, -94.164915)
  arc A0 (15.522194, -31.286053) -> (31.286053, -15.522194) centre (0, 0) ccw
  line L6 (33.507042, -17.740422) -> (31.719266, -16.853439)
  line L7 (17.526471, -33.075809) -> (16.753056, -31.516938)
  arc A1 (16.753056, -31.516938) -> (31.719266, -16.853439) centre (3.790359, -3.317307) ccw
  dimension "d169" = 1
  dimension "d172" = 1
extrude "Extrusion13" cut sketch "Sketch20" against normal blind 1 contours L4 A0 L3 L1 L2 L6 A1 L7 L5
sketch "Sketch21" plane through (0, 5, 0) normal (0, 1, 0) x (1, 0, 0)
  line L0 (31.719266, -10.124493) -> (13.677789, -27.994866)
  line L1 (47.835085, -94.164915) -> (45.4, -96.6)
  line L2 (13.677789, -27.994866) -> (47.835085, -94.164915)
  line L3 (47.835085, -94.164915) -> (43.1178, -96.6)
  line L4 (43.1178, -96.6) -> (43.1178, -101.6)
  line L5 (43.1178, -96.6) -> (43.1178, -101.6)
  line L6 (43.1178, -101.6) -> (100.933808, -101.6)
  line L7 (100.933808, -101.6) -> (101.6, -101.6)
  line L8 (101.6, 101.6) -> (101.6, -43.114)
  line L9 (101.6, -43.114) -> (101.6, -101.6)
  line L10 (101.6, -88.9) -> (101.6, 101.6)
  line L11 (101.6, -43.114) -> (96.6, -43.114)
  line L12 (96.6, -43.114) -> (91.337275, -46.432186)
  line L13 (94.164915, -47.835085) -> (31.719266, -16.853439)
  line L14 (91.337275, -46.432186) -> (27.19303, -14.607802)
extrude "Extrusion14" cut sketch "Sketch21" against normal blind 1
sketch "Sketch22" plane through (0, 5, 0) normal (0, 1, 0) x (1, 0, 0)
  point P0 (0, 0)
sketch "Sketch25" plane through (0, 5, 0) normal (0, 1, 0) x (1, 0, 0)
  line L0 (-96.6, 96.6) -> (-96.6, -96.6)
  line L1 (96.6, 96.6) -> (-96.6, 96.6)
  line L2 (-96.6, 96.6) -> (96.6, 96.6)
  line L3 (96.6, -45.4) -> (45.4, -96.6)
  line L4 (96.6, 96.6) -> (96.6, -45.4)
  line L5 (96.6, -45.4) -> (45.4, -96.6)
  line L6 (45.4, -96.6) -> (-96.6, -96.6)
  line L7 (-96.6, -96.6) -> (-96.6, 96.6)
  line L8 (-96.6, 96.6) -> (-89.528932, 89.528932)
  circle A0 centre (-89.528932, 89.528932) radius 5
  circle A1 centre (-89.528932, 89.528932) radius 1.5
  line L9 (-89.528932, 84.528932) -> (-96.6, 84.528932)
  line L10 (-89.528932, 89.528932) -> (-89.528932, 84.528932)
  line L11 (-89.528932, 89.528932) -> (-84.528932, 89.528932)
  line L12 (-84.528932, 96.6) -> (-84.528932, 89.528932)
  line L13 (-96.6, -96.6) -> (-89.528932, -89.528932)
  line L14 (-96.6, -96.6) -> (-86.6, -96.6) construction
  circle A2 centre (-89.528932, -89.528932) radius 5
  circle A3 centre (-89.528932, -89.528932) radius 1.75
  line L15 (-89.528932, -89.528932) -> (-84.528932, -89.528932)
  line L16 (-84.528932, -96.6) -> (-84.528932, -89.528932)
  line L17 (-89.528932, -89.528932) -> (-89.528932, -84.528932)
  line L18 (-96.6, -84.528932) -> (-89.528932, -84.528932)
  line L19 (96.6, 96.6) -> (89.528932, 89.528932)
  circle A4 centre (89.528932, 89.528932) radius 5
  circle A5 centre (89.528932, 89.528932) radius 1.75
  line L20 (89.528932, 89.528932) -> (84.528932, 89.528932)
  line L21 (84.528932, 96.6) -> (84.528932, 89.528932)
  line L22 (89.528932, 89.528932) -> (89.528932, 84.528932)
  line L23 (96.6, 84.528932) -> (89.528932, 84.528932)
  line L24 (96.6, -43.114) -> (96.6, 96.6)
  line L25 (-96.6, -96.6) -> (43.1178, -96.6)
  line L26 (28.991378, 5.656855) -> (-5.656854, -28.991377)
  line L27 (25.4, -25.4) -> (101.6, -25.4)
  line L28 (101.6, -88.9) -> (101.6, 101.6)
  line L29 (25.4, -25.4) -> (25.4, -101.6)
  line L30 (43.1178, -101.6) -> (-101.6, -101.6)
  line L31 (96.6, -25.4) -> (86.6, -25.4)
  circle A6 centre (86.6, -25.4) radius 5
  circle A7 centre (86.6, -25.4) radius 1.75
  line L32 (25.4, -96.6) -> (25.4, -86.6)
  circle A8 centre (25.4, -86.6) radius 5
  circle A9 centre (25.4, -86.6) radius 1.75
  point P0 (0, 0)
  dimension "d203" = 10
  dimension "d205" = 3
  dimension "d206" = 10
  dimension "d207" = 45
  dimension "d208" = 10
  dimension "d209" = 3.5
  dimension "d210" = 10
  dimension "d211" = 10
  dimension "d212" = 3.5
  dimension "d223" = 76.2
  dimension "d224" = 76.2
  dimension "d225" = 10
  dimension "d226" = 10
  dimension "d227" = 3.5
  dimension "d228" = 10
  dimension "d229" = 10
  dimension "d230" = 3.5
hole "Hole3" at (-89.528932, 5, 89.528932) at (-89.528932, 5, -89.528932) at (89.528932, 5, -89.528932) at (25.4, 5, 86.6) at (86.6, 5, 25.4) direction (0, -1, 0) diameter 2.85 depth 12.7 tip angle 118 countersink diameter 4.445 countersink angle 82 thread size "M3.5x0.6" class "6H" standard "ANSI Metric M Profile"
sketch "Sketch26" plane through (0, 5, 0) normal (0, 1, 0) x (1, 0, 0)
  line L0 (-96.6, -92.679258) -> (-96.6, -59.679258)
  line L1 (-68.6, -92.679258) -> (-96.6, -92.679258)
  line L2 (-96.6, -96.6) -> (43.1178, -96.6)
  line L3 (-68.6, -92.679258) -> (-68.6, -96.6)
  line L4 (-68.6, -92.679258) -> (7.4, -92.679258)
  circle A0 centre (-68.6, -92.679258) radius 1.5
  circle A1 centre (7.4, -92.679258) radius 1.5
  line L5 (-101.6, -101.6) -> (-101.6, 101.6)
  point P0 (0, 0)
  dimension "d232" = 3.92074
  dimension "d234" = 76
  dimension "d235" = 3
  dimension "d236" = 3
  dimension "d244" = 33
hole "Hole4" at (-68.6, 5, 92.679258) at (7.4, 5, 92.679258) direction (0, -1, 0) diameter 2.85 depth 2.54 tip angle 118 countersink diameter 3.175 countersink angle 82 thread size "M3.5x0.6" class "6H" standard "ANSI Metric M Profile"
sketch "Sketch28" plane through (0, 0, 0) normal (0, -1, 0) x (1, 0, 0)
  circle A0 centre (-6.381482, -33.94934) radius 1.425
  circle A1 centre (-6.381482, -33.94934) radius 1.425
  circle A2 centre (-33.953993, -6.376829) radius 1.425
  circle A3 centre (-33.953993, -6.376829) radius 1.425
  circle A4 centre (-5.28314, 22.294025) radius 1.425
  circle A5 centre (-5.28314, 22.294025) radius 1.425
  circle A6 centre (22.289371, -5.278486) radius 1.5113
  circle A7 centre (22.289371, -5.278486) radius 1.5113
  point P0 (0, 0)
  point P1 (0, 0)
fillet "Fillet5" radius 3.175 2 edges at (101.6, 1.5, -101.6) (-101.6, 1.5, -101.6)
sketch "Sketch29" plane through (0, 4, 0) normal (0, 1, 0) x (1, 0, 0)
  line L0 (96.6, -43.114) -> (96.6, 96.6)
  line L1 (0, 0) -> (18.582937, 0.245427)
  line L2 (0, 0) -> (0.183127, -13.865783)
  line L3 (0, 0) -> (31.843231, -31.01308)
  circle A0 centre (31.843231, -31.01308) radius 2.6
  line L4 (0, 0) -> (38.968155, -65.482234)
  line L5 (0, 0) -> (66.488529, -37.225201)
  circle A1 centre (66.488529, -37.225201) radius 2.6
  circle A2 centre (38.968155, -65.482234) radius 2.6
  dimension "d266" = 5.2
  dimension "d267" = 44.45
  dimension "d268" = 76.2
  dimension "d269" = 76.2
  dimension "d270" = 15
  dimension "d271" = 15
  dimension "d272" = 5.2
  dimension "d273" = 5.2
  dimension "d274" = 30
  dimension "d275" = 30
extrude "Extrusion16" cut sketch "Sketch29" against normal blind 2.2
equation "\"d1\" = d0"
equation "\"d2\" = 0.5 * d0"
equation "\"d3\" = 0.5 * d0"
properties part number "Box_Walls_2"
